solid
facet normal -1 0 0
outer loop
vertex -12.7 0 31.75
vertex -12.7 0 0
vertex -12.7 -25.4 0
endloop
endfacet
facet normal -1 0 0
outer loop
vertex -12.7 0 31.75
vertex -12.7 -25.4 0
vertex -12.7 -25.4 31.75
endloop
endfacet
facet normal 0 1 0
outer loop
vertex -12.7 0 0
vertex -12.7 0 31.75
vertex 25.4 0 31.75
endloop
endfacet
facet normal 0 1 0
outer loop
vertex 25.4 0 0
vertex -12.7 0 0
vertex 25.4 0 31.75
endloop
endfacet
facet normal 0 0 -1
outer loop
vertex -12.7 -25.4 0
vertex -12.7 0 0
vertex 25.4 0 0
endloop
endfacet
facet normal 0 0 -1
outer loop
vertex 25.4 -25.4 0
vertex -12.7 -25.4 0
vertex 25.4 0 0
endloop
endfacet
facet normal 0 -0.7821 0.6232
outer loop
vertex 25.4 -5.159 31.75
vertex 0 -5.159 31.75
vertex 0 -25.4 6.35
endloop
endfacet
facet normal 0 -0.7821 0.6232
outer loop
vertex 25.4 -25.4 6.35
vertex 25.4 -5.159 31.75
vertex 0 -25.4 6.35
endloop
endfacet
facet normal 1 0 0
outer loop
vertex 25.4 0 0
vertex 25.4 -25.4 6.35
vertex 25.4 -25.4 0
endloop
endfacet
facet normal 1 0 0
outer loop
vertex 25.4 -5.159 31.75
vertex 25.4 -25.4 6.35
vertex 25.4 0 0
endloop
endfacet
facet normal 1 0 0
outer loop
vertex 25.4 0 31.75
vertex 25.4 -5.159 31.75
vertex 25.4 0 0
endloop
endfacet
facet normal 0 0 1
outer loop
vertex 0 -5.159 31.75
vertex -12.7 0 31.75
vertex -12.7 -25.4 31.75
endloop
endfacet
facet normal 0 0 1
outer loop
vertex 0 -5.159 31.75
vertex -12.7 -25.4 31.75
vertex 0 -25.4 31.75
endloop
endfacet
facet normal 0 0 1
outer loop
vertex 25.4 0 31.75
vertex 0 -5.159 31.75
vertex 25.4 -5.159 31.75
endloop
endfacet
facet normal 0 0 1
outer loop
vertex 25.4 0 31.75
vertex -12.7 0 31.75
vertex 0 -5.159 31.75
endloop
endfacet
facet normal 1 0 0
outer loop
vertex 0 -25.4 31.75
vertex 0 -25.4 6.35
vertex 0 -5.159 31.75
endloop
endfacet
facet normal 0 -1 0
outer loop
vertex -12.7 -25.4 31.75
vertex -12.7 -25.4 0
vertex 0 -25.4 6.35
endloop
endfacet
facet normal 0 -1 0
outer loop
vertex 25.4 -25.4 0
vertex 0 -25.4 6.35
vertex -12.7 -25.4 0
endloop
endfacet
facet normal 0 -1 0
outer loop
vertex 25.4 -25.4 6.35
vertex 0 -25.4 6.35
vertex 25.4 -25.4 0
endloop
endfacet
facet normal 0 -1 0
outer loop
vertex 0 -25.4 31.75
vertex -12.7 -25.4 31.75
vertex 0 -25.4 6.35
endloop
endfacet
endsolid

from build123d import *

# Parameters (mm, degrees)
F1_DEPTH = 25.4
F2_W     = 12.7
F2_H     = 31.75
F3_DEPTH = 25.4


with BuildPart() as f1:
    # F0 (on Right) → F1 (new body)
    with BuildSketch(Plane.YZ):
        Polygon((-25.4, 0), (0, 0), (0, 31.75), (-5.158795, 31.75), (-25.4, 6.35), align=None)
    extrude(amount=F1_DEPTH)

    # F2 (on Front) → F3 (join)
    with BuildSketch(Plane.XZ):
        with Locations((-6.35, 15.875)):
            Rectangle(F2_W, F2_H)
    extrude(amount=F3_DEPTH)


solid = f1.part
